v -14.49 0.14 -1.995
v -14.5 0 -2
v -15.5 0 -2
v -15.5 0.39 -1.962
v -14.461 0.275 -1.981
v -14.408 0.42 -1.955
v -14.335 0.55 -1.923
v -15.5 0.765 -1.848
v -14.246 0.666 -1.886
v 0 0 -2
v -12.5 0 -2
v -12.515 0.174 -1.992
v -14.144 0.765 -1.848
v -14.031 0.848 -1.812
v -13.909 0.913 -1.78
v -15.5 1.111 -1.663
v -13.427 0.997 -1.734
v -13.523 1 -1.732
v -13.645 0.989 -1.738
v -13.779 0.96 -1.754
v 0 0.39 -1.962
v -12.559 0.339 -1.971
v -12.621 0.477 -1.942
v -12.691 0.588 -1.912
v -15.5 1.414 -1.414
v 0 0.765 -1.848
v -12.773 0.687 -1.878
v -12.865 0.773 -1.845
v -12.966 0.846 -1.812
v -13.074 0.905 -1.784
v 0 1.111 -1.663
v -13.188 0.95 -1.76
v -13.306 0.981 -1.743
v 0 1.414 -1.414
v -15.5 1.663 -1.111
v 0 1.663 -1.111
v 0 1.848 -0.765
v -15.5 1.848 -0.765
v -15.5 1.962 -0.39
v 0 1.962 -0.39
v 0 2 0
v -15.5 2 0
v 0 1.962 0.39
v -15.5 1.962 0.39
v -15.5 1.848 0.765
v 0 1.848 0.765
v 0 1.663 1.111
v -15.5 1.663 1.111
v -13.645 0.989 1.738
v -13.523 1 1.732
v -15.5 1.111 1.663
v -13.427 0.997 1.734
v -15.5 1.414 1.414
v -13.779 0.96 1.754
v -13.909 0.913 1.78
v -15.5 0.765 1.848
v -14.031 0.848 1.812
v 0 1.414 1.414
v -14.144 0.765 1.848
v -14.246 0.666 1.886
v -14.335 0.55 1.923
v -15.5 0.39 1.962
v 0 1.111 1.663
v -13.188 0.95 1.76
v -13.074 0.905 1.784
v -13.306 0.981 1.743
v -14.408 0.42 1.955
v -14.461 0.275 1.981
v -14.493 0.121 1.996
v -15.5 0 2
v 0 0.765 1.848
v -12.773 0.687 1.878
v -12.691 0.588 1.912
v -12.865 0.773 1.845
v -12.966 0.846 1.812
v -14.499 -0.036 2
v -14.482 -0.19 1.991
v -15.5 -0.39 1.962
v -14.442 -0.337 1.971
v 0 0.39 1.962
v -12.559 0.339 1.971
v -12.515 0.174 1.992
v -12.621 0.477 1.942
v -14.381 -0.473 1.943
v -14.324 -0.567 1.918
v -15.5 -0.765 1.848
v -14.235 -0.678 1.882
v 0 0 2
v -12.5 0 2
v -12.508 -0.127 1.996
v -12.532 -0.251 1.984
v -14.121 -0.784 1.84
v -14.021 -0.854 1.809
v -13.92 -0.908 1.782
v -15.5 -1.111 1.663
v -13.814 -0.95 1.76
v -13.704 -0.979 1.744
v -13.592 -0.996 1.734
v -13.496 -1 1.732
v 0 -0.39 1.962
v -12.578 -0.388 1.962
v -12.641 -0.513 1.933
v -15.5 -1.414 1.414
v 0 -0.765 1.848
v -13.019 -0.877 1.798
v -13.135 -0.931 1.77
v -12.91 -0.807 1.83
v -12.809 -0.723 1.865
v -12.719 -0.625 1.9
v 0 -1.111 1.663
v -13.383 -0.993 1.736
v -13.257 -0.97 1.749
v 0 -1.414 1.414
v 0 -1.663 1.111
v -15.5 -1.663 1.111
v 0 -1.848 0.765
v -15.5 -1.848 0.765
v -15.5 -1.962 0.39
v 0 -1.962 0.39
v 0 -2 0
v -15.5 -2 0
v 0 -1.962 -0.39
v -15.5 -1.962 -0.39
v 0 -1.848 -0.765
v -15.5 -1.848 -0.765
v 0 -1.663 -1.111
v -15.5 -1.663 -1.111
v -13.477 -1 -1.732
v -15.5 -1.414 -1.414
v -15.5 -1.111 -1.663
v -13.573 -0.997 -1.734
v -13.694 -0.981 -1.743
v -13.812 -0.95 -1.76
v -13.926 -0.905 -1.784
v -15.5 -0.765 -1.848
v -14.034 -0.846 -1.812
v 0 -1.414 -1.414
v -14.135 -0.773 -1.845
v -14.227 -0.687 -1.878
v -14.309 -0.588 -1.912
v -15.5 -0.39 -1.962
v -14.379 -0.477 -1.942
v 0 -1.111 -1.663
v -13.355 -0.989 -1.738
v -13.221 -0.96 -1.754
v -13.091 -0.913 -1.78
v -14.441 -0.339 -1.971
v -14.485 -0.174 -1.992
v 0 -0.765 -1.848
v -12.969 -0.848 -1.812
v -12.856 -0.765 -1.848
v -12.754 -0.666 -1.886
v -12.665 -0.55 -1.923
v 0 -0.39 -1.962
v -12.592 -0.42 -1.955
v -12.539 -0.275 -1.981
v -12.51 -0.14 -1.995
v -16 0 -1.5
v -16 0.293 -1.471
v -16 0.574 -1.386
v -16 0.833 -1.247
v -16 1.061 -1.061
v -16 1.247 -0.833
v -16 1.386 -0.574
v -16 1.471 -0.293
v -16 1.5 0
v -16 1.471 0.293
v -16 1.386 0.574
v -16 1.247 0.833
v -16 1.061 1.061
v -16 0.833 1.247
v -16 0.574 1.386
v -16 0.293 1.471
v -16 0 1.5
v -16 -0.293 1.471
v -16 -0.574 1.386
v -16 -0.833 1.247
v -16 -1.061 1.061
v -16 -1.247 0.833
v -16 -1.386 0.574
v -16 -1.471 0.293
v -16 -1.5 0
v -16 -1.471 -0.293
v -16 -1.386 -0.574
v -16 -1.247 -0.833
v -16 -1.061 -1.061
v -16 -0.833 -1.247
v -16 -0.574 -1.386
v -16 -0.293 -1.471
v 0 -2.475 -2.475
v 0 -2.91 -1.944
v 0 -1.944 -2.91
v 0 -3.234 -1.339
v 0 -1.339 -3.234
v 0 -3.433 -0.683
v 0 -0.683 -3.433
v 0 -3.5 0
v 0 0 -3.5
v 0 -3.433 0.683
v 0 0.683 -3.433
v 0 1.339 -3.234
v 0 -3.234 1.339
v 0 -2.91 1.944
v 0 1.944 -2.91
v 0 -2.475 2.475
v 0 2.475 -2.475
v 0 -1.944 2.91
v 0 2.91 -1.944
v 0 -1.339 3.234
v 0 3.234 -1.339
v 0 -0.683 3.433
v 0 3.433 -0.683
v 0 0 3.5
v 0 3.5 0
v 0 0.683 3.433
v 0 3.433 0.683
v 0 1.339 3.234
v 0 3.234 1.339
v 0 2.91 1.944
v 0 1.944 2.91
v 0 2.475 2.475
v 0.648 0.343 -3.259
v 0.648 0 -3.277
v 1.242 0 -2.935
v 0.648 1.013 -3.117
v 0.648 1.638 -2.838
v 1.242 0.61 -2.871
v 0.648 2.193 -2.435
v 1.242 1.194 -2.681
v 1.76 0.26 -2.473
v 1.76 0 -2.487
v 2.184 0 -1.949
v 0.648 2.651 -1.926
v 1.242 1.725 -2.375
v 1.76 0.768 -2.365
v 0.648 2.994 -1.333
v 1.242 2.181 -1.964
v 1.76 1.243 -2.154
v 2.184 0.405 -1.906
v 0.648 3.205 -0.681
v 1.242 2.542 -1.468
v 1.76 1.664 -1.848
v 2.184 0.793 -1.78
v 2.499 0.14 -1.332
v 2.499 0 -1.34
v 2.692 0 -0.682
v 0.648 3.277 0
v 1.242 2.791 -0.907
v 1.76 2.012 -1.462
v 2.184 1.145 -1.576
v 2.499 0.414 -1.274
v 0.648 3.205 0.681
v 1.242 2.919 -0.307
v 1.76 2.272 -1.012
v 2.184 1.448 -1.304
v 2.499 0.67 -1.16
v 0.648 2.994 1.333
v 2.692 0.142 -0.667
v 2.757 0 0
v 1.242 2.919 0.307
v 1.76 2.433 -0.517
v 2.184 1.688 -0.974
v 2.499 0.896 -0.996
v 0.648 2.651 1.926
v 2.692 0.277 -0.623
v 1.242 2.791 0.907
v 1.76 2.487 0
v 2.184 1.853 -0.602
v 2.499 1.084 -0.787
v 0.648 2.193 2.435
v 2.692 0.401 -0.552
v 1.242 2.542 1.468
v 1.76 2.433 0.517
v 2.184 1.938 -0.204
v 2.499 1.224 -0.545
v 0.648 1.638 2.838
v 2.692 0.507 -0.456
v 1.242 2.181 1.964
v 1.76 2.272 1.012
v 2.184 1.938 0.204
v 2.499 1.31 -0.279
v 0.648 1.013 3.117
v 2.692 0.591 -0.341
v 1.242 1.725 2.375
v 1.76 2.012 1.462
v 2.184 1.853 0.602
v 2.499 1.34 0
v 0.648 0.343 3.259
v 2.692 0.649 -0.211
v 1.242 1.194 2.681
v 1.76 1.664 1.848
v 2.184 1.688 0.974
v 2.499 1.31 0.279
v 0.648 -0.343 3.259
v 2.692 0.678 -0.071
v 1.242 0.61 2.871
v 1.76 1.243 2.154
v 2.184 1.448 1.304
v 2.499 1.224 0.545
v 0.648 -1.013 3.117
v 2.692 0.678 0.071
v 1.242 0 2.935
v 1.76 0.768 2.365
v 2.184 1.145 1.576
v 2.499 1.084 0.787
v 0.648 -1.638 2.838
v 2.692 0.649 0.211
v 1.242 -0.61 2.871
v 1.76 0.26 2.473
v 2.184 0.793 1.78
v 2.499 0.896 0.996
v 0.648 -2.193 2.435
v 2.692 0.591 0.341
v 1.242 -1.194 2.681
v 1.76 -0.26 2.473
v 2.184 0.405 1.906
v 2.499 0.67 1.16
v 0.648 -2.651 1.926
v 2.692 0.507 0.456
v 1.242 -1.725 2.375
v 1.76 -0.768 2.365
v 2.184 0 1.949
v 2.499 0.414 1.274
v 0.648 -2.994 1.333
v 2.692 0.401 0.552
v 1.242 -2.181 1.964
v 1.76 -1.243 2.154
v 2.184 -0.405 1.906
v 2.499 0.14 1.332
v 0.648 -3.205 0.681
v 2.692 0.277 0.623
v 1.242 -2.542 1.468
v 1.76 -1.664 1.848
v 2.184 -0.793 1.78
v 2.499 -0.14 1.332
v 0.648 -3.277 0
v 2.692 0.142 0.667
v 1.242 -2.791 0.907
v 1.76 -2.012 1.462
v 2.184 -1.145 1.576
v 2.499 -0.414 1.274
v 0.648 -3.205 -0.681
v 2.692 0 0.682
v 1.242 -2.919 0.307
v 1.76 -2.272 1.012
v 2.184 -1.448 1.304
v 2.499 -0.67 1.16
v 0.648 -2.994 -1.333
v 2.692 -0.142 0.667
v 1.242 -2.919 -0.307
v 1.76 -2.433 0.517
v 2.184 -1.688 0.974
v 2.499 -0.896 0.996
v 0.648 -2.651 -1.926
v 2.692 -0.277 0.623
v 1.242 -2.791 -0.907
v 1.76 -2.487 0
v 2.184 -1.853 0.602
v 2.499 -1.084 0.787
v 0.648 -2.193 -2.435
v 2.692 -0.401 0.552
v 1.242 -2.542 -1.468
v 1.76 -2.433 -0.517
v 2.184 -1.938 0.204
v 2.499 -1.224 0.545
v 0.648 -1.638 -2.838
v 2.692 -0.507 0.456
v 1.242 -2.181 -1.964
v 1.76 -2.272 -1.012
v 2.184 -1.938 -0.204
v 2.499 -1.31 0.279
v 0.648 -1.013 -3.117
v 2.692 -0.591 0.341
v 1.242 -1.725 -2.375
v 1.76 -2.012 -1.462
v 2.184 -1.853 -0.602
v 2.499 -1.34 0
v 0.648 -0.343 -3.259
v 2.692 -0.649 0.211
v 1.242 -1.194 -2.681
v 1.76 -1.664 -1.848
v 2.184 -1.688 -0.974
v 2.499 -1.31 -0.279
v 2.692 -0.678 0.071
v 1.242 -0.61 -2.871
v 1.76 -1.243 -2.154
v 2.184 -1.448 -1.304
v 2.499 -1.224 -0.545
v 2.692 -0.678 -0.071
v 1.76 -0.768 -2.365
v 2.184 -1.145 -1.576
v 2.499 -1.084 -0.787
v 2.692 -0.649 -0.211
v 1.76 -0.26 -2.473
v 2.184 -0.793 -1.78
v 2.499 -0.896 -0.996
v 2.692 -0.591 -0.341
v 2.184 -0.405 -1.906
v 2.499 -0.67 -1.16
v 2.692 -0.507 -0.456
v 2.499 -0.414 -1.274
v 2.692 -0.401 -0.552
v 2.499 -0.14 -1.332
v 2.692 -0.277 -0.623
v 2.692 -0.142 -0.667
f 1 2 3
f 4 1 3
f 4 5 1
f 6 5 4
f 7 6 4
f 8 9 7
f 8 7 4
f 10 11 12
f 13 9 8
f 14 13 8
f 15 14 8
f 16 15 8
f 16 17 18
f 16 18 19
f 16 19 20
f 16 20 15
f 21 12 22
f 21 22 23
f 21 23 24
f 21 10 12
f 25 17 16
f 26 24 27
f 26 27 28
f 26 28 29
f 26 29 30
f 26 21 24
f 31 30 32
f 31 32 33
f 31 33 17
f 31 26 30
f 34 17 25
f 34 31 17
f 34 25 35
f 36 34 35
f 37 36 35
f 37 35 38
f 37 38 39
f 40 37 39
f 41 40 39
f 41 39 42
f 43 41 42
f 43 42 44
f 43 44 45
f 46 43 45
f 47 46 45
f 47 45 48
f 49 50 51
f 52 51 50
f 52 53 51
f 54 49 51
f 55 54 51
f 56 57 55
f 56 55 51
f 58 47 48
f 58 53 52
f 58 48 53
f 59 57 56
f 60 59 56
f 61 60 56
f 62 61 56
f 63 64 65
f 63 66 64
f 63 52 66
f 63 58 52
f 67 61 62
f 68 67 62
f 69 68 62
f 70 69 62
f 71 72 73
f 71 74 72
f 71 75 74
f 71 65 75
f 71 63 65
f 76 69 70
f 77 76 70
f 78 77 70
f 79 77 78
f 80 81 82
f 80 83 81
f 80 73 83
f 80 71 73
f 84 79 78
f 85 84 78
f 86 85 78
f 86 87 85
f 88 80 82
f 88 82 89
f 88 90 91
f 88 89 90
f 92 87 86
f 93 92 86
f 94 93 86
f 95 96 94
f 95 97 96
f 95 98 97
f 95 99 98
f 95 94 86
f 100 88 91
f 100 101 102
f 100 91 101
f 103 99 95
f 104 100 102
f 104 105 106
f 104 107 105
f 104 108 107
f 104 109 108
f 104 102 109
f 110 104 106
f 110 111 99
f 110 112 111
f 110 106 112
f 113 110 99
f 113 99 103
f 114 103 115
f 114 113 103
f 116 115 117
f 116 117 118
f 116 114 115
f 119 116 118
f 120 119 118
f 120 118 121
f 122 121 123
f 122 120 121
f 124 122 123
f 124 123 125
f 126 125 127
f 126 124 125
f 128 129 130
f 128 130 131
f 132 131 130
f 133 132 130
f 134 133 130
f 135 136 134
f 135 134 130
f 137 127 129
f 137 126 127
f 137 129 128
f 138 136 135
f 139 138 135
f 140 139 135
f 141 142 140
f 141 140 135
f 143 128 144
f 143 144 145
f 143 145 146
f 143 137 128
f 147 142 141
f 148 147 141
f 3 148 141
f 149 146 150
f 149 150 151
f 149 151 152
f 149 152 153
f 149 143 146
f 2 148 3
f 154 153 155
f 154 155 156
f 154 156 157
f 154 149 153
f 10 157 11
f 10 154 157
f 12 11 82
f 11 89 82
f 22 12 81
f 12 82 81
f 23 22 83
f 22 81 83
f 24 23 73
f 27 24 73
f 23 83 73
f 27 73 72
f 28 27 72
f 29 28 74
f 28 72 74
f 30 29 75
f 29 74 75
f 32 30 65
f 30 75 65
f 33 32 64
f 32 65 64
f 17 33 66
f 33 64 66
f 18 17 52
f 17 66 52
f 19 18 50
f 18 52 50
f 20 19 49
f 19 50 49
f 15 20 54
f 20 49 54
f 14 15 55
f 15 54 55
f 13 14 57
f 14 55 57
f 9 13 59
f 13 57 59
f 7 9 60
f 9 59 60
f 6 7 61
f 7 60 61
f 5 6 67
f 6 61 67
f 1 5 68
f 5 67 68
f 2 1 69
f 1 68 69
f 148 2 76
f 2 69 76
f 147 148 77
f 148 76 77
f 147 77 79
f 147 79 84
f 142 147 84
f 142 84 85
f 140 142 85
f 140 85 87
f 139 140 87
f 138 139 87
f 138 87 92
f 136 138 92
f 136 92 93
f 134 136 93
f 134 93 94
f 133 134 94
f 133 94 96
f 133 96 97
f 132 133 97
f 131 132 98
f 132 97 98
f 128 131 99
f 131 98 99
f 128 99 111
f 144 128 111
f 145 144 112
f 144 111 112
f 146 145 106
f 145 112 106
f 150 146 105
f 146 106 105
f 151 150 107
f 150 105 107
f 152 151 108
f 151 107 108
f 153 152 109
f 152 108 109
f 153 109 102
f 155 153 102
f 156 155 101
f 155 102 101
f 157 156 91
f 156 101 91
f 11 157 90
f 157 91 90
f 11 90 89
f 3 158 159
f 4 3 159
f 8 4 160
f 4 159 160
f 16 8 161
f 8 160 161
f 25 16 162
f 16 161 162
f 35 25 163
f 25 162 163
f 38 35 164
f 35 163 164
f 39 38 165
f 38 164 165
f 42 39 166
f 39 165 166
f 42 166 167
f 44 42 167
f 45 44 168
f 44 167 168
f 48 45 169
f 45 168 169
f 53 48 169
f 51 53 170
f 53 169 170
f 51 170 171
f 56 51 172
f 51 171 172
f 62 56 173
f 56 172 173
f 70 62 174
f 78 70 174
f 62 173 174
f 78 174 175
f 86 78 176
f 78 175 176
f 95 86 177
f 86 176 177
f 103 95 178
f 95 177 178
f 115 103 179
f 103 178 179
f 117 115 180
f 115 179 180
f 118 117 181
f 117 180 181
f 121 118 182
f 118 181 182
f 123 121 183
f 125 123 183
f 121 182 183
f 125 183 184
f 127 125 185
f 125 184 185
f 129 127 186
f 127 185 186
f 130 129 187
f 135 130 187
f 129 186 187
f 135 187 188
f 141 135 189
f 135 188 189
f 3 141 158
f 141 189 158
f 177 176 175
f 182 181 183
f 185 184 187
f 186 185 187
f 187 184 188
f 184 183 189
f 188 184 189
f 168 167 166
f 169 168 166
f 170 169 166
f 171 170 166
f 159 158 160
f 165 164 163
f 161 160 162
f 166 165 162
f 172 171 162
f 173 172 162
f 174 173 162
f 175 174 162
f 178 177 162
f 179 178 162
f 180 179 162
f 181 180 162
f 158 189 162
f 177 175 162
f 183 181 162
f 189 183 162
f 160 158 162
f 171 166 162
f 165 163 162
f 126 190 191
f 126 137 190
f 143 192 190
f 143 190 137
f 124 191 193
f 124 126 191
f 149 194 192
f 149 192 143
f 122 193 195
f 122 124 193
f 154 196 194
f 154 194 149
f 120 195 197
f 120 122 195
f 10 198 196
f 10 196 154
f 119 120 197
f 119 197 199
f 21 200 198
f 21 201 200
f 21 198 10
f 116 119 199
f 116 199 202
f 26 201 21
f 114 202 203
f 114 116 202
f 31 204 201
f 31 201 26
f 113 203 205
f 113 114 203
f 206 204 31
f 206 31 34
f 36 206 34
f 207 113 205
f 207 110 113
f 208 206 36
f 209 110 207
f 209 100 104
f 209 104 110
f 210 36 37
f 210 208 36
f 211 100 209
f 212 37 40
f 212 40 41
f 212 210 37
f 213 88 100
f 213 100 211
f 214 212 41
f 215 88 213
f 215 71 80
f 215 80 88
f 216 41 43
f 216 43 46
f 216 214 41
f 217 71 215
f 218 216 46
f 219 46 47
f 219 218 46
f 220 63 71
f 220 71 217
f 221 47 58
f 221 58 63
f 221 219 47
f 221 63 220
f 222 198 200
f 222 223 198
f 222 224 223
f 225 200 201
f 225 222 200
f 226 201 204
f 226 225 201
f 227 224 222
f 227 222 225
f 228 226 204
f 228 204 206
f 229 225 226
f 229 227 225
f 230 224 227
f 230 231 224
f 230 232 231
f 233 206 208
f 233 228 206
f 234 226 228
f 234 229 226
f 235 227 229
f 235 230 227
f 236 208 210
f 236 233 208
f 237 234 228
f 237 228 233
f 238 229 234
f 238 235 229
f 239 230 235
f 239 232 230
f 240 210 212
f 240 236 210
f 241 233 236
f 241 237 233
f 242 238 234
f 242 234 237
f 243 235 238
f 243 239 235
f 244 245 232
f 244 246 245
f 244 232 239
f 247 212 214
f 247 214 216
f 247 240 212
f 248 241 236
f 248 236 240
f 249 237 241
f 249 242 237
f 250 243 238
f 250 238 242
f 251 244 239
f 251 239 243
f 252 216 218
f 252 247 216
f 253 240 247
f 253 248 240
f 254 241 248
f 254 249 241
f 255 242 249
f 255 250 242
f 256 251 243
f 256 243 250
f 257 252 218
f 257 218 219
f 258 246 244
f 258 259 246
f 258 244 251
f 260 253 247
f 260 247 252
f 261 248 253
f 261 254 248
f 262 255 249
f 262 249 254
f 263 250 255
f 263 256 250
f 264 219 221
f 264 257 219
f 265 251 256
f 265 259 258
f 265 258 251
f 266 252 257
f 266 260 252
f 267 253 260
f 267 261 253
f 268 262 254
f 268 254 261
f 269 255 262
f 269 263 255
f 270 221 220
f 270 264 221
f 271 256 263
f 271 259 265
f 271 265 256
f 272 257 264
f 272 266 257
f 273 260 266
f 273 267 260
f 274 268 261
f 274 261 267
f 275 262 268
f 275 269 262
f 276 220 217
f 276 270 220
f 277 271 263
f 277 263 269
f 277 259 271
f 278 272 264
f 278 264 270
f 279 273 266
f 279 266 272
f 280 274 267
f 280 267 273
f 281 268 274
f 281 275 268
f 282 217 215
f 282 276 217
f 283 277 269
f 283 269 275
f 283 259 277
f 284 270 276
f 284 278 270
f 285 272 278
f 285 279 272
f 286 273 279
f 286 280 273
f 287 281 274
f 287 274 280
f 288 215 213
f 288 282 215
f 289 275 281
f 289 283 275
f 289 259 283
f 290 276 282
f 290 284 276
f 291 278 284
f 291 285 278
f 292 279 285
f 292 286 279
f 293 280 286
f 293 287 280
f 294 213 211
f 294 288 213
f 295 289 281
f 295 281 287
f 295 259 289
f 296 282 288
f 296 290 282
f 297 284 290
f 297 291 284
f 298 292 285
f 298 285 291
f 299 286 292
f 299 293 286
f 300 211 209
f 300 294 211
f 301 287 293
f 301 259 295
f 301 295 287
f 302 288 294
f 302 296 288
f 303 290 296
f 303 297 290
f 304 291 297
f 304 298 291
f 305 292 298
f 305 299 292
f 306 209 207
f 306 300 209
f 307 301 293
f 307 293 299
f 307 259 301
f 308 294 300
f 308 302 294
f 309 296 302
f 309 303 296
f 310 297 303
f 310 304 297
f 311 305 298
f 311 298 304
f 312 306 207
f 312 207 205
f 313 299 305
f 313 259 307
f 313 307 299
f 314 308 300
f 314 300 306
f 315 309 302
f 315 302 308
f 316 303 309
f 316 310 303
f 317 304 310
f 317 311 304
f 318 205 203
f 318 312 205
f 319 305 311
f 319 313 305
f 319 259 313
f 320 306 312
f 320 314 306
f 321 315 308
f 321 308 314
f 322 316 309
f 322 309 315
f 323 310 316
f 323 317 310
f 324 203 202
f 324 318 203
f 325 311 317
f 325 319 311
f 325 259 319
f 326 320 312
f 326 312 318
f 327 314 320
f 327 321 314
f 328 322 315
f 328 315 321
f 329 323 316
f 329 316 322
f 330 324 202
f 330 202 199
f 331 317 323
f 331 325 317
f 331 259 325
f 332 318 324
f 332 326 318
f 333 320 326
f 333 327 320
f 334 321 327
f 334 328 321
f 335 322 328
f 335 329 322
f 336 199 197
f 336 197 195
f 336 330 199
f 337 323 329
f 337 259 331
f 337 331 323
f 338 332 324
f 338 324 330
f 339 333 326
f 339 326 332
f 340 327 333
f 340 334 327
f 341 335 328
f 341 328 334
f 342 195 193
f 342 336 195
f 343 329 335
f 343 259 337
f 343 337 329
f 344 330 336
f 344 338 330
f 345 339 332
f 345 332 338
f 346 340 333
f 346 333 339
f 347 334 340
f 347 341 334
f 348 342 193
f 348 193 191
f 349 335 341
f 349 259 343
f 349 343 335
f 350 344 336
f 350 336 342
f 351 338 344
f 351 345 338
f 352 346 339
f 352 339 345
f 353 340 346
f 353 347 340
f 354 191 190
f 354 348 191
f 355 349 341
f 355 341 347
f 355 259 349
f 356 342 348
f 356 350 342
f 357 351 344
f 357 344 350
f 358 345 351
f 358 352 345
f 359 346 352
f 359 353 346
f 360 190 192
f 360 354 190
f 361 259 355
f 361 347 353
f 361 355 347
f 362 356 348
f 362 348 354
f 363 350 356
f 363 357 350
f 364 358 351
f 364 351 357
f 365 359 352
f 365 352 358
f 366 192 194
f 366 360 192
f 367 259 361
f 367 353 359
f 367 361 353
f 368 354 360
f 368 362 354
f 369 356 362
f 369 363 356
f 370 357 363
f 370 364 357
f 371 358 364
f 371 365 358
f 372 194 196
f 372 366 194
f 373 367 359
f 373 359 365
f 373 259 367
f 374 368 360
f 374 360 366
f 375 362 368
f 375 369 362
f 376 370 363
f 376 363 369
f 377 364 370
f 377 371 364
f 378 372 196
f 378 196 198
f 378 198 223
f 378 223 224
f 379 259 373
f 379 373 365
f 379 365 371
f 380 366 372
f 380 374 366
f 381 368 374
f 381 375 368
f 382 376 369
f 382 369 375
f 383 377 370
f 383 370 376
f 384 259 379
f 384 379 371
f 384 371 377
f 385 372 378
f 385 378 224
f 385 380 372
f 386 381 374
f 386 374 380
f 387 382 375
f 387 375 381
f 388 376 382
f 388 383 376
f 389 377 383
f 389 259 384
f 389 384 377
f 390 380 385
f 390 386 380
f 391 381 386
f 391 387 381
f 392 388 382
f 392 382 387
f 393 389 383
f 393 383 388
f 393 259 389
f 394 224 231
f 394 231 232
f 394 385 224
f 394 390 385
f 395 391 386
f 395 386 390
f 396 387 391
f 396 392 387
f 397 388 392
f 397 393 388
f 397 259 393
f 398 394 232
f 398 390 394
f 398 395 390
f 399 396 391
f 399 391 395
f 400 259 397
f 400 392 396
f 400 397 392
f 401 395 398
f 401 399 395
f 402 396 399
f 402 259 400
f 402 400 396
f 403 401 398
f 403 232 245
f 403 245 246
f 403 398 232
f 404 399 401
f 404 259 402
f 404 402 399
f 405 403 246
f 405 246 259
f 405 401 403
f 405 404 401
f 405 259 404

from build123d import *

# Parameters (mm, degrees)
SKETCH1_R               = 2
BOSS_EXTRUDE1_DEPTH     = 16
SKETCH2_R               = 1
CUT_EXTRUDE1_DEPTH      = 3
CUT_EXTRUDE1_DEPTH_BACK = 3
CHAMFER1_SIZE           = 0.5


with BuildPart() as part:
    # Sketch1 → Boss-Extrude1 (new body)
    with BuildSketch(Plane(origin=(0, 0, 0), x_dir=(0, 0, -1), z_dir=(1, 0, 0))):
        Circle(SKETCH1_R)
    extrude(amount=-BOSS_EXTRUDE1_DEPTH)

    # Sketch2 → Cut-Extrude1 (cut, two sides)
    with BuildSketch(Plane.XY) as cut_extrude1_sk:
        with Locations((-13.5, 0)):
            Circle(SKETCH2_R)
    extrude(amount=CUT_EXTRUDE1_DEPTH, mode=Mode.SUBTRACT)
    extrude(cut_extrude1_sk.sketch, amount=-CUT_EXTRUDE1_DEPTH_BACK, mode=Mode.SUBTRACT)

    # Sketch3 → Revolve1 (revolve)
    with BuildSketch(Plane(origin=(0, 0, 0), x_dir=(1, 0, 0), z_dir=(0, 1, 0))):
        with BuildLine():
            Line((2.757385023, 0), (0, 0))
            Line((0, 0), (0, 3.5))
            ThreePointArc((0, 3.5), (1.985229955, 2.227844932), (2.757385023, 0))
        make_face()
    revolve(axis=Axis((-5.097766842, 0, 0), (1, 0, 0)))

    # Chamfer1
    chamfer1_edges = [part.edges().sort_by_distance(p)[0] for p in [
        (-16, 0, 2),
    ]]
    chamfer(chamfer1_edges, length=CHAMFER1_SIZE)


solid = part.part
